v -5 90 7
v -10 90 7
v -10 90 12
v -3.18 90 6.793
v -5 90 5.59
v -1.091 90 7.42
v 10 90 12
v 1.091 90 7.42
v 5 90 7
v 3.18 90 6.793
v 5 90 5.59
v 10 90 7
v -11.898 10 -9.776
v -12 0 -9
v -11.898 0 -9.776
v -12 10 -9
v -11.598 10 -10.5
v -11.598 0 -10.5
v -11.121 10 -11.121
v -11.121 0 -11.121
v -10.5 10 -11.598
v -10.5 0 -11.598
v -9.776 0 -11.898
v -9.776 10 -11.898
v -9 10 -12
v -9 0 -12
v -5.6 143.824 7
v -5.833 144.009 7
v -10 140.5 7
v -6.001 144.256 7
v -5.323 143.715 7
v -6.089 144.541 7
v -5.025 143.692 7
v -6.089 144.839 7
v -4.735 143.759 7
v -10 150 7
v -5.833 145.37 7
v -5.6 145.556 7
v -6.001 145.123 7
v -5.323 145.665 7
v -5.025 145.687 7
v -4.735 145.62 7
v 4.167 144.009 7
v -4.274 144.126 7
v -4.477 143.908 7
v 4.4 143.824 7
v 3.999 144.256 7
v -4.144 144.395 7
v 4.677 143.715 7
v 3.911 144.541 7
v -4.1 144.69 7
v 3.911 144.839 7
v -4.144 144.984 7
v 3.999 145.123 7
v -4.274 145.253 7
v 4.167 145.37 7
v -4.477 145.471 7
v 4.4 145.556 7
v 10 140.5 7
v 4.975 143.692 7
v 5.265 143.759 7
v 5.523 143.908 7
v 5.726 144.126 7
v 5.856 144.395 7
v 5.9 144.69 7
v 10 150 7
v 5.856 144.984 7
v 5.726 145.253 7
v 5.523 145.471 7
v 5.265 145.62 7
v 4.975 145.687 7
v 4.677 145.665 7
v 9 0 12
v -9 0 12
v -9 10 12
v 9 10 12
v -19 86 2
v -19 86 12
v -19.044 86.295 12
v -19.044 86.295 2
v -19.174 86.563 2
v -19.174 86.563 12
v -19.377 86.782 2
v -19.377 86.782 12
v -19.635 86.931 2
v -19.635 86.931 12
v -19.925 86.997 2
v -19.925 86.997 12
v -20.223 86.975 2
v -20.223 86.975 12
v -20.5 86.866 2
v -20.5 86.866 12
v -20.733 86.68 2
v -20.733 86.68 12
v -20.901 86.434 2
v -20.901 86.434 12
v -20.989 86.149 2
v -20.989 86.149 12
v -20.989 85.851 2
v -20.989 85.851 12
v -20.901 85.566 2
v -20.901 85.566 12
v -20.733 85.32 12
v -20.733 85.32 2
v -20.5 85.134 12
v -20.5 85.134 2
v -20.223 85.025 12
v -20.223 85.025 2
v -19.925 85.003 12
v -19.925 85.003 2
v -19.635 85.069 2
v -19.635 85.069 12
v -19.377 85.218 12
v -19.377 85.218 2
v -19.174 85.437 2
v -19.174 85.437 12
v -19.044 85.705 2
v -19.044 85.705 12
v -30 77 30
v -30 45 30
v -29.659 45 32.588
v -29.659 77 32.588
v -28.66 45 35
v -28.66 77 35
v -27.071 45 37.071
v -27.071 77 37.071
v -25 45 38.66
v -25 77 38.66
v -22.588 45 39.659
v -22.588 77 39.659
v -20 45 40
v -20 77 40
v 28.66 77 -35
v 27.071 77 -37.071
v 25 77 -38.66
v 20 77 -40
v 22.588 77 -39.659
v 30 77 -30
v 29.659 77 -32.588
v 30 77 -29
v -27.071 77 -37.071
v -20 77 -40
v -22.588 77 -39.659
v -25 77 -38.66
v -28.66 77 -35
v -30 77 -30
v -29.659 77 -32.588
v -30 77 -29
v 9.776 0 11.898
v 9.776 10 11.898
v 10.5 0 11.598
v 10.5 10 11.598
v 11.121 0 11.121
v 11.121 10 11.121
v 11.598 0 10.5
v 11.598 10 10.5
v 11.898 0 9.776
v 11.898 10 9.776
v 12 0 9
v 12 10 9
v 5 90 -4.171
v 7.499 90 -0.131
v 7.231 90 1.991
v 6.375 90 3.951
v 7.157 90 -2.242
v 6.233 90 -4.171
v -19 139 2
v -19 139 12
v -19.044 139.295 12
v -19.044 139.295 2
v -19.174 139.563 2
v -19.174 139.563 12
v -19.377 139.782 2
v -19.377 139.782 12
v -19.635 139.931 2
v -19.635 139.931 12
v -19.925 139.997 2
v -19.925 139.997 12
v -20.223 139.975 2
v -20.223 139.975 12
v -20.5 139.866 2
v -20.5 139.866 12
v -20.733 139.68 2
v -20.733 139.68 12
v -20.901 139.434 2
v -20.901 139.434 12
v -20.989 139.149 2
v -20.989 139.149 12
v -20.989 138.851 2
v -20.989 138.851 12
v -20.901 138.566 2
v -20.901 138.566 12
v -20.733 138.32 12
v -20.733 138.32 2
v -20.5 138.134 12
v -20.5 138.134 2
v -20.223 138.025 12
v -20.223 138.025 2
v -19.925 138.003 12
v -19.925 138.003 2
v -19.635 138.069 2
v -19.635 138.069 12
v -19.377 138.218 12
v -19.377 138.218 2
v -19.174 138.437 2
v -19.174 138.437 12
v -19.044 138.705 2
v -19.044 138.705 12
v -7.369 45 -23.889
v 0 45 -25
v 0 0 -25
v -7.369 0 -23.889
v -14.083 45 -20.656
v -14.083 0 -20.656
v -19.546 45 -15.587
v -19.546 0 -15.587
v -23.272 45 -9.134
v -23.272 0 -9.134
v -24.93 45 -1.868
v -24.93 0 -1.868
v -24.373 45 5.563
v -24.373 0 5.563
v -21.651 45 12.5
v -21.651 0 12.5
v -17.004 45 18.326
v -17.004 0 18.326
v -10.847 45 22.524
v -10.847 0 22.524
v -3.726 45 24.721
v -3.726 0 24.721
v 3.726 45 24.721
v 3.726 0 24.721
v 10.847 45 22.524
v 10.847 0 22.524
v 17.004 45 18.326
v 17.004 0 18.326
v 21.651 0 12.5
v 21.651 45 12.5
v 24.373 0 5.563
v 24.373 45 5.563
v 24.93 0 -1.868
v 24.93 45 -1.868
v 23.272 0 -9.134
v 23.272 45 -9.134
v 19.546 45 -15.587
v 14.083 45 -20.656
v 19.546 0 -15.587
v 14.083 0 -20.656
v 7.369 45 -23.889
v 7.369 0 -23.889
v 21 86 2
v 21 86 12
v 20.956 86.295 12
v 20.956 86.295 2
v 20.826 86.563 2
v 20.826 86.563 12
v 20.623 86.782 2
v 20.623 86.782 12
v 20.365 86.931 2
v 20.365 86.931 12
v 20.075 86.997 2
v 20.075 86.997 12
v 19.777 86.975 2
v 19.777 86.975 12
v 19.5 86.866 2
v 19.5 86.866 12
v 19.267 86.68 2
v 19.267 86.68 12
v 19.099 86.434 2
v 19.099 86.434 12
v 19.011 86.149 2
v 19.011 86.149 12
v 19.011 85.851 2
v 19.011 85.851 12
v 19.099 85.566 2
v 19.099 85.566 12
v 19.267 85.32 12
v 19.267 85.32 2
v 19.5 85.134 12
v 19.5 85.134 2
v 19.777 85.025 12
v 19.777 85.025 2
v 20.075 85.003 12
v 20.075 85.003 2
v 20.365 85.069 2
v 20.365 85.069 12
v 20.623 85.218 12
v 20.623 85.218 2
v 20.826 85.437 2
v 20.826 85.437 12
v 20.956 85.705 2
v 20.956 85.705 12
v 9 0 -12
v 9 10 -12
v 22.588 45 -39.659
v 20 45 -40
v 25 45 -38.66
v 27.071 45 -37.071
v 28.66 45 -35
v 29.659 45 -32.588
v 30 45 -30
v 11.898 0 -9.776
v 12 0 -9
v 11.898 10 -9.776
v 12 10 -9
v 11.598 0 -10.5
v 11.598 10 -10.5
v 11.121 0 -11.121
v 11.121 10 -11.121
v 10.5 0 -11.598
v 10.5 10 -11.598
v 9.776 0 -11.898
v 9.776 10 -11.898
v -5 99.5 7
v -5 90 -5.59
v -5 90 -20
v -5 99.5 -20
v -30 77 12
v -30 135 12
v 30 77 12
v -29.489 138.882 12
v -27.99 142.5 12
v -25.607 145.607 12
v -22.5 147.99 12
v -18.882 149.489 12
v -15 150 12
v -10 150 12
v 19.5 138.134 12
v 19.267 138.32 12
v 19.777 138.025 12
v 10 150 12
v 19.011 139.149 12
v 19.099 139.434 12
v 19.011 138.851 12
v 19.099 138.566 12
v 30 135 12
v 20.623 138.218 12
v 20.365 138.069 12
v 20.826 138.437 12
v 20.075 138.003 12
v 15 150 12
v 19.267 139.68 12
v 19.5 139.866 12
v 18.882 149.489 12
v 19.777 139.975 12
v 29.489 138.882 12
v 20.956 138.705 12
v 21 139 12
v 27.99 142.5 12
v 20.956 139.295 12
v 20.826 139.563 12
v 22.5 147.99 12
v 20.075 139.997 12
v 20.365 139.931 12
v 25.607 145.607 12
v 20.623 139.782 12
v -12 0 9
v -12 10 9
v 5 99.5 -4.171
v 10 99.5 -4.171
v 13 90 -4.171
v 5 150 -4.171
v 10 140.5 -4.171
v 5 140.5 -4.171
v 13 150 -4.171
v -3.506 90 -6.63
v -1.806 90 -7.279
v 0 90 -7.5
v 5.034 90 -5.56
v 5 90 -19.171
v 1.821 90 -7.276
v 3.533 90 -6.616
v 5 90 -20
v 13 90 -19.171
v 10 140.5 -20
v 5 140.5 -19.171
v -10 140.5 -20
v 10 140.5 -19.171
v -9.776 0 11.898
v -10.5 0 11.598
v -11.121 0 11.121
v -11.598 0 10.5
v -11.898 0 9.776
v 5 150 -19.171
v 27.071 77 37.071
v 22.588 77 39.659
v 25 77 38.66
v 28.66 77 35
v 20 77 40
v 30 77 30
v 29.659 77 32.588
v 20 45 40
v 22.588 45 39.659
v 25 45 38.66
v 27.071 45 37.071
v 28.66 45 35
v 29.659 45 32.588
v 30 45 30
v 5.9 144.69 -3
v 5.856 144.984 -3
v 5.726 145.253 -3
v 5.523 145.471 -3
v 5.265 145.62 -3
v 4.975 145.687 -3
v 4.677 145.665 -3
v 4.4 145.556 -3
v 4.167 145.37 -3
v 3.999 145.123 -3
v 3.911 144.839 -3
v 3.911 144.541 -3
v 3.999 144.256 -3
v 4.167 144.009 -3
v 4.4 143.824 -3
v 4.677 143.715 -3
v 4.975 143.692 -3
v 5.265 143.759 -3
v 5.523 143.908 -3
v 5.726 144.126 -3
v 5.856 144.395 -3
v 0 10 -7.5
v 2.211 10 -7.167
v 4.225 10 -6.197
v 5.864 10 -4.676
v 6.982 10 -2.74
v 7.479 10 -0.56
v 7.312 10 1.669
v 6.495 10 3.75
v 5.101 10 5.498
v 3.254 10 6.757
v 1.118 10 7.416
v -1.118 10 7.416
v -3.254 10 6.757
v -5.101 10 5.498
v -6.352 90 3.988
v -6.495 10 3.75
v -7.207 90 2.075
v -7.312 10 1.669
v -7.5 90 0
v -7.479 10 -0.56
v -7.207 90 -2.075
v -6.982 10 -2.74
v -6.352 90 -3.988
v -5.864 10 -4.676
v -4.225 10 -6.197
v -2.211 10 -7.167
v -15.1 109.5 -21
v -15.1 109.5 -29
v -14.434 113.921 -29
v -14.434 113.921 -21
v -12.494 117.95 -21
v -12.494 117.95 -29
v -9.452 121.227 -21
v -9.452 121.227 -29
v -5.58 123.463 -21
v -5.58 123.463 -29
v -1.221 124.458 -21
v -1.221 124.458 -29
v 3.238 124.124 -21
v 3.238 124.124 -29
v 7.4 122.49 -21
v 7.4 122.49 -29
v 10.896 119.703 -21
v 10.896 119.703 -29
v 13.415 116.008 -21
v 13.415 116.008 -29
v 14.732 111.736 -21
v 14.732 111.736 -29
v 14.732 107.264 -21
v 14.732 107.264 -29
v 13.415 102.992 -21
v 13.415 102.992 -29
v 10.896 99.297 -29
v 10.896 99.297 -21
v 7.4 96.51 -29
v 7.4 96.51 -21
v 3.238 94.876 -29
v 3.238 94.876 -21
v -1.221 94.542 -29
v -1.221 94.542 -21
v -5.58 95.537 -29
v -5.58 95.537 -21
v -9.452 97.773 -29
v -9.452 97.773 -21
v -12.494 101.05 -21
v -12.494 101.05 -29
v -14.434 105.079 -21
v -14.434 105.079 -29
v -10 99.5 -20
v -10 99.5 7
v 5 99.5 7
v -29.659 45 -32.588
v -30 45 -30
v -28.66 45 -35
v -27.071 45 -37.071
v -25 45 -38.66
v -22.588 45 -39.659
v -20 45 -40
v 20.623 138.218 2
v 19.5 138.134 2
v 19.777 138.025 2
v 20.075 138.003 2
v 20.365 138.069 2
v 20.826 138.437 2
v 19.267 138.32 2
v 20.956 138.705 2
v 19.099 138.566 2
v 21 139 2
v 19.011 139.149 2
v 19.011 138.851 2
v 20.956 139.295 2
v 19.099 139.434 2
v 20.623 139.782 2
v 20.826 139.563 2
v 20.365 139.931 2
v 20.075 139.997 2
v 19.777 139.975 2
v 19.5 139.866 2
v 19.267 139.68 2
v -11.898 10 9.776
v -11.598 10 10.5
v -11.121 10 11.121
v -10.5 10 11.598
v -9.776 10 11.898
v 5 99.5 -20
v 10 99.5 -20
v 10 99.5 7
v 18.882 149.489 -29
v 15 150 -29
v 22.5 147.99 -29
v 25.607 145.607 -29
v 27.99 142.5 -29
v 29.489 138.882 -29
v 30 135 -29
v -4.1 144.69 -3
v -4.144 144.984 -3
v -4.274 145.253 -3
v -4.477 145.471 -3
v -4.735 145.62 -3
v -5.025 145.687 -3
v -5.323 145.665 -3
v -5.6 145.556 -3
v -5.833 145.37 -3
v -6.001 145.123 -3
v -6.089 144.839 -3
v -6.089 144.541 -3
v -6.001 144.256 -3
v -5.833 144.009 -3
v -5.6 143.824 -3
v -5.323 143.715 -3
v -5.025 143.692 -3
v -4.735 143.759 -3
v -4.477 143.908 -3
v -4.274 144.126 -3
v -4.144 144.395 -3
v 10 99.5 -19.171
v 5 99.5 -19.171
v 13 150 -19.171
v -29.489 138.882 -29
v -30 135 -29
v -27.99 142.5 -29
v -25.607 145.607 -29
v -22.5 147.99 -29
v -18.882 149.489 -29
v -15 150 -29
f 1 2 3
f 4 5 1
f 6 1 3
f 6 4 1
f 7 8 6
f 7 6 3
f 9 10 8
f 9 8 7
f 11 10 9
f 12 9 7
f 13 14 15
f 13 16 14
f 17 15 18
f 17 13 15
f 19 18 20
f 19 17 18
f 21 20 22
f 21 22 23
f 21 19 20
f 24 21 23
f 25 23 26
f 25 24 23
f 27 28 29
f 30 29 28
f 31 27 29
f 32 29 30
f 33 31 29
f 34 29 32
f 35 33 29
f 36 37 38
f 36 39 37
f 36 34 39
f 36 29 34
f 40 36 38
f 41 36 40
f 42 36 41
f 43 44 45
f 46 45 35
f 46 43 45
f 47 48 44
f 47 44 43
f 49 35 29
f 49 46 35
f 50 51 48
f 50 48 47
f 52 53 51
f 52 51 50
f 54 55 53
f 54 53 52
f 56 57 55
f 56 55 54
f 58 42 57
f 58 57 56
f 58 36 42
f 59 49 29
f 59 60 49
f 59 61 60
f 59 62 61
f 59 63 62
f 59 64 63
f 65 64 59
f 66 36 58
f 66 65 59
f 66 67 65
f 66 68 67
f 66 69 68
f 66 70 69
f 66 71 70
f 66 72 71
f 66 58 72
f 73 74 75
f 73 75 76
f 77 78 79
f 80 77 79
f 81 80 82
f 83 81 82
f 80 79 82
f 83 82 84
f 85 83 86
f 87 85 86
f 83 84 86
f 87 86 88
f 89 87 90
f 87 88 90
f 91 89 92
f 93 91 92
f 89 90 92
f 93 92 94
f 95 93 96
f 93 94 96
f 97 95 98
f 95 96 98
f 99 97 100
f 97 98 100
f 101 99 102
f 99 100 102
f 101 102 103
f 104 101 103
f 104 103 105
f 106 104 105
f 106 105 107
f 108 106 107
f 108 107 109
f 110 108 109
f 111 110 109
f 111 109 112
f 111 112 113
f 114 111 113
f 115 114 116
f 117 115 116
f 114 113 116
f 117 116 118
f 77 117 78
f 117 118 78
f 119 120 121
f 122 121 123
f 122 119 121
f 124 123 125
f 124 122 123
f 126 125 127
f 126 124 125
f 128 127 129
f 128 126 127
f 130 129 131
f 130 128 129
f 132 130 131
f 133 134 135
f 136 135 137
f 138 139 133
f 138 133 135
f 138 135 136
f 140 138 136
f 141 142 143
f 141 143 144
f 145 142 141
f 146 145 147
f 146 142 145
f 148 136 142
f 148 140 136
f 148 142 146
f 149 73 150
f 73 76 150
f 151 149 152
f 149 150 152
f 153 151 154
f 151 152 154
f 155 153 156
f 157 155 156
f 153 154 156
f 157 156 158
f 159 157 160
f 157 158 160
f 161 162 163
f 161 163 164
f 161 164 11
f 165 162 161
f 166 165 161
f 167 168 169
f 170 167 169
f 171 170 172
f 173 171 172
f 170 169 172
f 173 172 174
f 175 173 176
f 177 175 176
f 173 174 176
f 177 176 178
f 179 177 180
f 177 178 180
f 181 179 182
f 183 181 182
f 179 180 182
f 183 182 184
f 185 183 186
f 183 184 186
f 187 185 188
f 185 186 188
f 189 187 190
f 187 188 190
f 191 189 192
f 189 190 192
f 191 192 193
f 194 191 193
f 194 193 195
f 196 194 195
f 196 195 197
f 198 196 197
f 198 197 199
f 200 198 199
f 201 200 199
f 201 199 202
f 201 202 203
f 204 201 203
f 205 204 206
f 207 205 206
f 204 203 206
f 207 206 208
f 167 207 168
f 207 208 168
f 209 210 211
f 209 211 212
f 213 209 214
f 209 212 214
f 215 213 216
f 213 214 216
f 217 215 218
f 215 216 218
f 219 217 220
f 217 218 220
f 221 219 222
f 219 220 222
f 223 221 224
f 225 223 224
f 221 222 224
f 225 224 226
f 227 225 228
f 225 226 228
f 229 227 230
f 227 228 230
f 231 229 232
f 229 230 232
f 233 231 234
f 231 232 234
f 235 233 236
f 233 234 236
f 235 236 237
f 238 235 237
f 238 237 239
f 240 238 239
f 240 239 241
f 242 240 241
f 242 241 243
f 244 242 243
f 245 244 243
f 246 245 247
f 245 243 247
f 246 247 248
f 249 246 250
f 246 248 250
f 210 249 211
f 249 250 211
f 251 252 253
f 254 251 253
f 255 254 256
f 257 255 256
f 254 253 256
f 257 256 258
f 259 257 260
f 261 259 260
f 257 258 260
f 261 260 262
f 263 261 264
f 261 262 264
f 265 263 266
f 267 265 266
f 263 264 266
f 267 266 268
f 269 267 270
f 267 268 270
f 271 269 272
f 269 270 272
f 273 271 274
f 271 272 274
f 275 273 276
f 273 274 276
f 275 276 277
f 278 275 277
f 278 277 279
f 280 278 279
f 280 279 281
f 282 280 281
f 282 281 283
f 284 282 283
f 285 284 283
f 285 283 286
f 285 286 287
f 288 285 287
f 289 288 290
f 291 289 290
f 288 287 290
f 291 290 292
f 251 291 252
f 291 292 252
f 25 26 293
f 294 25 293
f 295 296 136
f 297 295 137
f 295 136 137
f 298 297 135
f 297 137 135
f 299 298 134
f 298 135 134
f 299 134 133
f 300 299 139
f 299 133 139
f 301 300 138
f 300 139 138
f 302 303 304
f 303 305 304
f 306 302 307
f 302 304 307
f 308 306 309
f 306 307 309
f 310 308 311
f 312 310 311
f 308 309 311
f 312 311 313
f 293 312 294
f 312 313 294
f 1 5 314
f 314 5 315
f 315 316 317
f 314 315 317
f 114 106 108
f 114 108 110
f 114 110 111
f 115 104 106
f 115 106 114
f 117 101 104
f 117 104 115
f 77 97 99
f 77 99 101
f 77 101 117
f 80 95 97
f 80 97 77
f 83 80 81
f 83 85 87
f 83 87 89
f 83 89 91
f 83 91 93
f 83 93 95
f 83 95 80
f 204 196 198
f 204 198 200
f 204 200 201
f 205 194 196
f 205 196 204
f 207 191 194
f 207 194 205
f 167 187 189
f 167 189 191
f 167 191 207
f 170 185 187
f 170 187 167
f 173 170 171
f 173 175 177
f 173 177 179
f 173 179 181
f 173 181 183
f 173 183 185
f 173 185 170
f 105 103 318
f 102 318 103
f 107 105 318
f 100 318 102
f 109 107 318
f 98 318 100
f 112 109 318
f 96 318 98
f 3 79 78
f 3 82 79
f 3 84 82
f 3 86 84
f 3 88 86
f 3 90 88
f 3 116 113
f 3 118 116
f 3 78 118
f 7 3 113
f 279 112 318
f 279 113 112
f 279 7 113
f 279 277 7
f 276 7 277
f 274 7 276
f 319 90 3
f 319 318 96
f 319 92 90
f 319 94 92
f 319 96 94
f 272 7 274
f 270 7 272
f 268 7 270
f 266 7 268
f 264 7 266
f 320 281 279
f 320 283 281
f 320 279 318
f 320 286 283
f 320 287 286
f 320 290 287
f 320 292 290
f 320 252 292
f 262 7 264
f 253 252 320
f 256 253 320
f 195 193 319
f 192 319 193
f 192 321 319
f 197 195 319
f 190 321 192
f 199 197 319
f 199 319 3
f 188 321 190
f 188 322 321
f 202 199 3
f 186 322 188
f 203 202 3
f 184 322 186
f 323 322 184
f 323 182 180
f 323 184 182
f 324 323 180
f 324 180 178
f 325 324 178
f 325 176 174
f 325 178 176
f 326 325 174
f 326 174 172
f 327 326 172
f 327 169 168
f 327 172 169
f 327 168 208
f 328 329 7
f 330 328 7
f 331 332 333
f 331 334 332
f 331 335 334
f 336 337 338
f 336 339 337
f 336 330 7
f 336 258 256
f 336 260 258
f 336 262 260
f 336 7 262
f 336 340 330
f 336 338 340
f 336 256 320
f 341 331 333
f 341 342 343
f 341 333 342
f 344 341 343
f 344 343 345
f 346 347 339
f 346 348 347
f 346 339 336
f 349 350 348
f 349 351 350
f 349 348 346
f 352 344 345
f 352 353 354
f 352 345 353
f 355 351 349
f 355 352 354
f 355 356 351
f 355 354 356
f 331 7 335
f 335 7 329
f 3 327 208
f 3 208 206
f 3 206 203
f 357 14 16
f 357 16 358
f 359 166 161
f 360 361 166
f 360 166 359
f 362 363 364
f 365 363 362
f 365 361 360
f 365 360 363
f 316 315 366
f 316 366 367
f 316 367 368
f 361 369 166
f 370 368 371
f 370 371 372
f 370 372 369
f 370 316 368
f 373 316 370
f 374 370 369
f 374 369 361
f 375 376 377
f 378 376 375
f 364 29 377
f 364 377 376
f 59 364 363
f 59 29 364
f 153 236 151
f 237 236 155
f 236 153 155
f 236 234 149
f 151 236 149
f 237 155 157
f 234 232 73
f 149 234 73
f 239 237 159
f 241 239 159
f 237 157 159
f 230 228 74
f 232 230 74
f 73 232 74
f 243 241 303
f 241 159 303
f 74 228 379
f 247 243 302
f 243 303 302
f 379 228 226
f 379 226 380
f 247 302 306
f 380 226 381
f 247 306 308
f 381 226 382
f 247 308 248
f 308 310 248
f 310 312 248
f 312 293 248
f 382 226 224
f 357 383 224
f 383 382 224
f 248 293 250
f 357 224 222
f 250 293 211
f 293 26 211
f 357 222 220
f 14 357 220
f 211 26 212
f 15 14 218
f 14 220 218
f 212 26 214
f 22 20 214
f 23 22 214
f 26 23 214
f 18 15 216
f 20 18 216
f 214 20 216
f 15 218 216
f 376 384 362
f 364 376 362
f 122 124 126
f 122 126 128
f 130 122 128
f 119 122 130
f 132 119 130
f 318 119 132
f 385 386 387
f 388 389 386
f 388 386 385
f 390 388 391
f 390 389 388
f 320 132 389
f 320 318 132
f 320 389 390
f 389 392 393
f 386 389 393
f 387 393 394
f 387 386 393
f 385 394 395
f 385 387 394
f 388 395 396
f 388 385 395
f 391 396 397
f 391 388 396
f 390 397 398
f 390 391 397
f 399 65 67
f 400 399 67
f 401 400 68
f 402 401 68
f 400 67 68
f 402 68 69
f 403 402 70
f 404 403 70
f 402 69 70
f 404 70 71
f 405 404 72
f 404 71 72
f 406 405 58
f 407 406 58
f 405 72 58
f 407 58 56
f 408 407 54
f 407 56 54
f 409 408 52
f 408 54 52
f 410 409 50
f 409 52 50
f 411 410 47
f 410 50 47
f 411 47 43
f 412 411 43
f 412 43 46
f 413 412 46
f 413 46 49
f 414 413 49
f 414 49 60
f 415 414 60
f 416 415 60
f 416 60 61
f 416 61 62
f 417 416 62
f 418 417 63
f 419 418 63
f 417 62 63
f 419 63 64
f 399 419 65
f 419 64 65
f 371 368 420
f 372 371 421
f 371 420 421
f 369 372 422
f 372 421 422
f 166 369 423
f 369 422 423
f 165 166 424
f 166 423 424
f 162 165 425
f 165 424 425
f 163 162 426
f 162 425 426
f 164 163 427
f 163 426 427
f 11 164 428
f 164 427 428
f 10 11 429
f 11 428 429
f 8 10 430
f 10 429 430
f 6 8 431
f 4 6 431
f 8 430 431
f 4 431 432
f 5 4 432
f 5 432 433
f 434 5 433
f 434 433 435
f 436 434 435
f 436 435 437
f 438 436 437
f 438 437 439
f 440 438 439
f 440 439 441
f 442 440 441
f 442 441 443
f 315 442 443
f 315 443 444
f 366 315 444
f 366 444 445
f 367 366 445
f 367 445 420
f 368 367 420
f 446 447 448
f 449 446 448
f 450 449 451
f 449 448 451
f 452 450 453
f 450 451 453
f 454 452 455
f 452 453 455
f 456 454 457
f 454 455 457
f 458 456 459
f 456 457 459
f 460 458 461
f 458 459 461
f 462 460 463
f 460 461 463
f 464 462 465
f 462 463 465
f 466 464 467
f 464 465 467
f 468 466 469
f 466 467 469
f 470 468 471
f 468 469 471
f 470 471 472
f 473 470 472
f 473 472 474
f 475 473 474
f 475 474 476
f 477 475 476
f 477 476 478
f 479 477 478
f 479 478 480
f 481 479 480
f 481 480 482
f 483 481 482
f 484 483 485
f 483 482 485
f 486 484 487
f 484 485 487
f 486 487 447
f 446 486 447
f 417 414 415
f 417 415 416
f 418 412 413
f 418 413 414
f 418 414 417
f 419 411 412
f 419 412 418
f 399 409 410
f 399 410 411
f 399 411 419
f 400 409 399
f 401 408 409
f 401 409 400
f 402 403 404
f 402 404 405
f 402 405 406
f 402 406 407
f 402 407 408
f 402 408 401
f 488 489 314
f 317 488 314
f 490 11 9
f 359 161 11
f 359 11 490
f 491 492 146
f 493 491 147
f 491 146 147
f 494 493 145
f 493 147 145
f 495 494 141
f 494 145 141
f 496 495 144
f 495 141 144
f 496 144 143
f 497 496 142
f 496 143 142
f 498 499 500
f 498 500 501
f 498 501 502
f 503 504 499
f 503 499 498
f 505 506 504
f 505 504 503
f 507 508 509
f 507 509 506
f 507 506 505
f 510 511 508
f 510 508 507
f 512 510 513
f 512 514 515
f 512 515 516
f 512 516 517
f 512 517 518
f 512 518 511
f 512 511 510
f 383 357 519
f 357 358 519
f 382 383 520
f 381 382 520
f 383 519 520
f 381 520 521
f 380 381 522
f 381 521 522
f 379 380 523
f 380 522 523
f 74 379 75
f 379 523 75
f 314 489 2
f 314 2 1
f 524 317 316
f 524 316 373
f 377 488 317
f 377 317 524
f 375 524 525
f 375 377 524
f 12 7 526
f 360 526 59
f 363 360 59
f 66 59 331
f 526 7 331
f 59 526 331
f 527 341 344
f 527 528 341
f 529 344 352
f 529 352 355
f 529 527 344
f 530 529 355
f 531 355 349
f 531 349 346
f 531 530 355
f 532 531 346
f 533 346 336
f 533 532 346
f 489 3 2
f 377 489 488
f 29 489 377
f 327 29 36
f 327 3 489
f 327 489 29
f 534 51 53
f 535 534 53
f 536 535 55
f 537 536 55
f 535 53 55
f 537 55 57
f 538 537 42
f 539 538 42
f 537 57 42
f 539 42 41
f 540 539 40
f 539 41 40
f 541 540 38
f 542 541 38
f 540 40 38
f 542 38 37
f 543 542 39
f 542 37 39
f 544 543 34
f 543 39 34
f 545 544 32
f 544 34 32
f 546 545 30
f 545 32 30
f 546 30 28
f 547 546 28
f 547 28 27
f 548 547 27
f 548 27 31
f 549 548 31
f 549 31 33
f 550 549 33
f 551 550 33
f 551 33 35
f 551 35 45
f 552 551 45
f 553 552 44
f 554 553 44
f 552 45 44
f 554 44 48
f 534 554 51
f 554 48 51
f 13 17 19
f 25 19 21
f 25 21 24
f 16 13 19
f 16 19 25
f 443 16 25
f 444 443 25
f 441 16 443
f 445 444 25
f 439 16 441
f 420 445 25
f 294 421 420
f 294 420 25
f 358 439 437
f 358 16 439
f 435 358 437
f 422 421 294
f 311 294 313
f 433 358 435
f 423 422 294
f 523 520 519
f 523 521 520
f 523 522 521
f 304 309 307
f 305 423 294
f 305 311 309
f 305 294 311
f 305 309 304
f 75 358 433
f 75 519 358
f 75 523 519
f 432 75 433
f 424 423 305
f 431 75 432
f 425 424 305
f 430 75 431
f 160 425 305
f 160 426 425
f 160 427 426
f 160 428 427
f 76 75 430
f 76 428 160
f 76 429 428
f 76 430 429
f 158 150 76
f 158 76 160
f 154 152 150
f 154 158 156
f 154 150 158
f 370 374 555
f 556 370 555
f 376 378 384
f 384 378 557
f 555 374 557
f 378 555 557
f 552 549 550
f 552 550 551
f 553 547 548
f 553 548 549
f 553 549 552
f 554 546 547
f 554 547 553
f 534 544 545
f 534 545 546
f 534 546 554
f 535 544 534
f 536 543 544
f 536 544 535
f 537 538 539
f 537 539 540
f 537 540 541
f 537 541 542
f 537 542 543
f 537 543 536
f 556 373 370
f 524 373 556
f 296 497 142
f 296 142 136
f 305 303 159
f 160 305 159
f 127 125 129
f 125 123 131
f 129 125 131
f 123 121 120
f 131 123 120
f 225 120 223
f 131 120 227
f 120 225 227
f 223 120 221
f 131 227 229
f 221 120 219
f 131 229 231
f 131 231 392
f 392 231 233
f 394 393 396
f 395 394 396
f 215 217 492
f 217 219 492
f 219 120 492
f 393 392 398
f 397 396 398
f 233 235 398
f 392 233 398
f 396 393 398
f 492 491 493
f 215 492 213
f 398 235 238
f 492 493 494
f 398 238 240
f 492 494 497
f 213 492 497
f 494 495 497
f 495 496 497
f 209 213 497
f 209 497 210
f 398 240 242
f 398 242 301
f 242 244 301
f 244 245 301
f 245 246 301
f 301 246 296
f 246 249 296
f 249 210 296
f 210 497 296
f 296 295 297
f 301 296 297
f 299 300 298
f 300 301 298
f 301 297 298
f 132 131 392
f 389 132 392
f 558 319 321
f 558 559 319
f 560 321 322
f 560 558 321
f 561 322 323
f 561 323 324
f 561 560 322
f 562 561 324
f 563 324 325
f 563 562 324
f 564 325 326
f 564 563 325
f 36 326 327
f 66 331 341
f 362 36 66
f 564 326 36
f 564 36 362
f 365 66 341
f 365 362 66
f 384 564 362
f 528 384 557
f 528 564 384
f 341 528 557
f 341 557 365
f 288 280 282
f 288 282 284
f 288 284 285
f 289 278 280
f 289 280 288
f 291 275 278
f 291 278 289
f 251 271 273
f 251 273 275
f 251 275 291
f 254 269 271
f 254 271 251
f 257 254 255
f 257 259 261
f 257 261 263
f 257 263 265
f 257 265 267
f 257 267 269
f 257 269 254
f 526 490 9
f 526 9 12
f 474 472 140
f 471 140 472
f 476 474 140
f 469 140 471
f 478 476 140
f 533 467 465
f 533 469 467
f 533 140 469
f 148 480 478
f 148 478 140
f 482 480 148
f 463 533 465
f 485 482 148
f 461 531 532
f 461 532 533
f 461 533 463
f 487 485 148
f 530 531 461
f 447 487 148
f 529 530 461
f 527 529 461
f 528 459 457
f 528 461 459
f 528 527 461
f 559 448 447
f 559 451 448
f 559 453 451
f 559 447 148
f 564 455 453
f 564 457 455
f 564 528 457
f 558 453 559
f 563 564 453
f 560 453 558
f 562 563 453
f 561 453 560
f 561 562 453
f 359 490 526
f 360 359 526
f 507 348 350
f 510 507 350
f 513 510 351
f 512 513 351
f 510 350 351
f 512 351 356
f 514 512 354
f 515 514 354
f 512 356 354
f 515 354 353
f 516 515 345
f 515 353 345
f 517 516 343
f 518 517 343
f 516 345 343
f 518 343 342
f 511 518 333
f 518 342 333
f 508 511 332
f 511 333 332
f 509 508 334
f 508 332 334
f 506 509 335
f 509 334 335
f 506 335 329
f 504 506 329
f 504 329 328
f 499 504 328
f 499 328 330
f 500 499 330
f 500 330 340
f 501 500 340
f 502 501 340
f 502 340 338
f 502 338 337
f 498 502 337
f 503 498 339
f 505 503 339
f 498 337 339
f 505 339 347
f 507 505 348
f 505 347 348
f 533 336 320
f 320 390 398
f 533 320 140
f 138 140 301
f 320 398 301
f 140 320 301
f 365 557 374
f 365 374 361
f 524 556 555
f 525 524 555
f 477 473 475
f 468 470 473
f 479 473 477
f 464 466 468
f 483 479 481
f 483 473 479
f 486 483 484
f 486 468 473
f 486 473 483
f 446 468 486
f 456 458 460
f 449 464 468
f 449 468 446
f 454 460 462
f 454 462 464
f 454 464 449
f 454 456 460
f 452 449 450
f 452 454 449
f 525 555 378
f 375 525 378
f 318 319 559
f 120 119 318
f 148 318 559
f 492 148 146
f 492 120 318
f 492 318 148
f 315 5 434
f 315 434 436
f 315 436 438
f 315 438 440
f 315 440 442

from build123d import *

# Parameters (mm, degrees)
SKETCH1_R                = 25
BOSS_EXTRUDE1_DEPTH      = 45
SKETCH2_W                = 60
SKETCH2_H                = 80
BOSS_EXTRUDE2_DEPTH      = 45
FILLET1_R                = 10
SKETCH3_W                = 60
SKETCH3_H                = 41
BOSS_EXTRUDE3_DEPTH      = 60
SKETCH4_W                = 20
SKETCH4_H                = 41
CUT_EXTRUDE1_DEPTH       = 32
SKETCH5_W                = 20
SKETCH5_H                = 9.5
CUT_EXTRUDE2_DEPTH       = 5
SKETCH7_R                = 15
CUT_EXTRUDE3_DEPTH       = 8
CUT_EXTRUDE4_REACH       = 163.567
SKETCH8_R                = 21
FILLET2_R                = 15
CUT_EXTRUDE5_REACH       = 169.812
SKETCH9_W                = 65
SKETCH9_H                = 65
CUT_EXTRUDE6_REACH       = 163.567
SKETCH10_W               = 65
SKETCH10_H               = 65
SKETCH11_R               = 1
CUT_EXTRUDE7_DEPTH       = 10
SKETCH12_R               = 1
CUT_EXTRUDE8_DEPTH       = 10
CUT_EXTRUDE9_START       = -27
SKETCH13_W               = 10
SKETCH13_H               = 9.5
CUT_EXTRUDE9_DEPTH       = 27
CUT_EXTRUDE10_DEPTH      = 5
CUT_EXTRUDE10_DEPTH_BACK = 3
SKETCH14_W               = 15
SKETCH14_H               = 62.680052408
SKETCH15_R               = 7.5
CUT_EXTRUDE11_DEPTH      = 90
SKETCH16_W               = 24
SKETCH16_H               = 24
CUT_EXTRUDE12_DEPTH      = 10
FILLET3_R                = 3


with BuildPart() as part:
    # Sketch1 → Boss-Extrude1 (new body)
    with BuildSketch(Plane(origin=(0, 0, 0), x_dir=(1, 0, 0), z_dir=(0, 1, 0))):
        with Locations(Location((0, 0, 0), (0, 0, 90))):
            Circle(SKETCH1_R)
    extrude(amount=BOSS_EXTRUDE1_DEPTH)

    # Sketch2 → Boss-Extrude2 (add)
    with BuildSketch(Plane(origin=(0, 45, 0), x_dir=(1, 0, 0), z_dir=(0, 1, 0))):
        Rectangle(SKETCH2_W, SKETCH2_H)
    extrude(amount=BOSS_EXTRUDE2_DEPTH)

    # Fillet1
    fillet1_edges = [part.edges().sort_by_distance(p)[0] for p in [
        (-30, 67.5, -40),
        (-30, 67.5, 40),
        (30, 67.5, 40),
        (30, 67.5, -40),
    ]]
    fillet(fillet1_edges, radius=FILLET1_R)

    # Sketch3 → Boss-Extrude3 (add)
    with BuildSketch(Plane(origin=(0, 90, 0), x_dir=(1, 0, 0), z_dir=(0, 1, 0))):
        with Locations((0, 8.5)):
            Rectangle(SKETCH3_W, SKETCH3_H)
    extrude(amount=BOSS_EXTRUDE3_DEPTH)

    # Sketch4 → Cut-Extrude1 (cut)
    with BuildSketch(Plane.XY.offset(12)):
        with Locations((0, 120)):
            Rectangle(SKETCH4_W, SKETCH4_H)
    extrude(amount=-CUT_EXTRUDE1_DEPTH, mode=Mode.SUBTRACT)

    # Sketch5 → Cut-Extrude2 (cut)
    with BuildSketch(Plane.XY.offset(12)):
        with Locations((0, 94.75)):
            Rectangle(SKETCH5_W, SKETCH5_H)
        with Locations((0, 145.25)):
            Rectangle(SKETCH5_W, SKETCH5_H)
    extrude(amount=-CUT_EXTRUDE2_DEPTH, mode=Mode.SUBTRACT)

    # Sketch7 → Cut-Extrude3 (cut)
    with BuildSketch(Plane(origin=(0, 0, -29), x_dir=(-1, 0, 0), z_dir=(0, 0, -1))):
        with Locations((0.1, 109.5)):
            Circle(SKETCH7_R)
    extrude(amount=-CUT_EXTRUDE3_DEPTH, mode=Mode.SUBTRACT)

    # Sketch8 → Cut-Extrude4 (cut, up to next)
    with BuildSketch(Plane.XY.offset(12), mode=Mode.PRIVATE) as cut_extrude4_sk1:
        with Locations((-0.1, 109.5)):
            Circle(SKETCH8_R)
    cut_extrude4_tool1 = extrude(cut_extrude4_sk1.sketch, amount=CUT_EXTRUDE4_REACH, mode=Mode.PRIVATE) & part.part
    add(cut_extrude4_tool1.solids().sort_by_distance((-0.1, 109.5, 12))[0], mode=Mode.SUBTRACT)

    # Fillet2
    fillet2_edges = [part.edges().sort_by_distance(p)[0] for p in [
        (-30, 150, -8.5),
        (30, 150, -8.5),
    ]]
    fillet(fillet2_edges, radius=FILLET2_R)

    # Sketch9 → Cut-Extrude5 (cut, up to next)
    with BuildSketch(Plane(origin=(0, 0, -29), x_dir=(-1, 0, 0), z_dir=(0, 0, -1)), mode=Mode.PRIVATE) as cut_extrude5_sk1:
        with Locations((0.1, 109.5)):
            Rectangle(SKETCH9_W, SKETCH9_H)
    cut_extrude5_tool1 = extrude(cut_extrude5_sk1.sketch, amount=CUT_EXTRUDE5_REACH, mode=Mode.PRIVATE) & part.part
    add(cut_extrude5_tool1.solids().sort_by_distance((-0.1, 109.5, -29))[0], mode=Mode.SUBTRACT)

    # Sketch10 → Cut-Extrude6 (cut, up to next)
    with BuildSketch(Plane.XY.offset(12), mode=Mode.PRIVATE) as cut_extrude6_sk1:
        with Locations((-0.1, 109.5)):
            Rectangle(SKETCH10_W, SKETCH10_H)
    cut_extrude6_tool1 = extrude(cut_extrude6_sk1.sketch, amount=CUT_EXTRUDE6_REACH, mode=Mode.PRIVATE) & part.part
    add(cut_extrude6_tool1.solids().sort_by_distance((-0.1, 109.5, 12))[0], mode=Mode.SUBTRACT)

    # Sketch11 → Cut-Extrude7 (cut)
    with BuildSketch(Plane.XY.offset(12)):
        with Locations((-20, 86)):
            Circle(SKETCH11_R)
        with Locations((20, 86)):
            Circle(SKETCH11_R)
        with Locations((20, 139)):
            Circle(SKETCH11_R)
        with Locations((-20, 139)):
            Circle(SKETCH11_R)
    extrude(amount=-CUT_EXTRUDE7_DEPTH, mode=Mode.SUBTRACT)

    # Sketch12 → Cut-Extrude8 (cut)
    with BuildSketch(Plane.XY.offset(7)):
        with Locations((4.9, 144.689613301)):
            Circle(SKETCH12_R)
        with Locations((-5.1, 144.689613301)):
            Circle(SKETCH12_R)
    extrude(amount=-CUT_EXTRUDE8_DEPTH, mode=Mode.SUBTRACT)

    # Sketch13 → Cut-Extrude9 (cut)
    with BuildSketch(Plane.XY.offset(7).offset(CUT_EXTRUDE9_START)):
        with Locations((0, 94.75)):
            Rectangle(SKETCH13_W, SKETCH13_H)
    extrude(amount=CUT_EXTRUDE9_DEPTH, mode=Mode.SUBTRACT)

    # Sketch14 → Cut-Extrude10 (cut, two sides: drawn at the far end of the back side and taken through both)
    with BuildSketch(Plane.ZY.offset(-10).offset(-CUT_EXTRUDE10_DEPTH_BACK)):
        with Locations((-11.671219496, 121.340026204)):
            Rectangle(SKETCH14_W, SKETCH14_H)
    extrude(amount=CUT_EXTRUDE10_DEPTH + CUT_EXTRUDE10_DEPTH_BACK, mode=Mode.SUBTRACT)

    # Sketch15 → Cut-Extrude11 (cut)
    with BuildSketch(Plane.XZ):
        with Locations(Location((0, 0, 0), (0, 0, 270))):
            Circle(SKETCH15_R)
    extrude(amount=-CUT_EXTRUDE11_DEPTH, mode=Mode.SUBTRACT)

    # Sketch16 → Cut-Extrude12 (cut)
    with BuildSketch(Plane.XZ):
        Rectangle(SKETCH16_W, SKETCH16_H)
    extrude(amount=-CUT_EXTRUDE12_DEPTH, mode=Mode.SUBTRACT)

    # Fillet3
    fillet3_edges = [part.edges().sort_by_distance(p)[0] for p in [
        (-12, 5, -12),
        (-12, 5, 12),
        (12, 5, 12),
        (12, 5, -12),
    ]]
    fillet(fillet3_edges, radius=FILLET3_R)


solid = part.part
